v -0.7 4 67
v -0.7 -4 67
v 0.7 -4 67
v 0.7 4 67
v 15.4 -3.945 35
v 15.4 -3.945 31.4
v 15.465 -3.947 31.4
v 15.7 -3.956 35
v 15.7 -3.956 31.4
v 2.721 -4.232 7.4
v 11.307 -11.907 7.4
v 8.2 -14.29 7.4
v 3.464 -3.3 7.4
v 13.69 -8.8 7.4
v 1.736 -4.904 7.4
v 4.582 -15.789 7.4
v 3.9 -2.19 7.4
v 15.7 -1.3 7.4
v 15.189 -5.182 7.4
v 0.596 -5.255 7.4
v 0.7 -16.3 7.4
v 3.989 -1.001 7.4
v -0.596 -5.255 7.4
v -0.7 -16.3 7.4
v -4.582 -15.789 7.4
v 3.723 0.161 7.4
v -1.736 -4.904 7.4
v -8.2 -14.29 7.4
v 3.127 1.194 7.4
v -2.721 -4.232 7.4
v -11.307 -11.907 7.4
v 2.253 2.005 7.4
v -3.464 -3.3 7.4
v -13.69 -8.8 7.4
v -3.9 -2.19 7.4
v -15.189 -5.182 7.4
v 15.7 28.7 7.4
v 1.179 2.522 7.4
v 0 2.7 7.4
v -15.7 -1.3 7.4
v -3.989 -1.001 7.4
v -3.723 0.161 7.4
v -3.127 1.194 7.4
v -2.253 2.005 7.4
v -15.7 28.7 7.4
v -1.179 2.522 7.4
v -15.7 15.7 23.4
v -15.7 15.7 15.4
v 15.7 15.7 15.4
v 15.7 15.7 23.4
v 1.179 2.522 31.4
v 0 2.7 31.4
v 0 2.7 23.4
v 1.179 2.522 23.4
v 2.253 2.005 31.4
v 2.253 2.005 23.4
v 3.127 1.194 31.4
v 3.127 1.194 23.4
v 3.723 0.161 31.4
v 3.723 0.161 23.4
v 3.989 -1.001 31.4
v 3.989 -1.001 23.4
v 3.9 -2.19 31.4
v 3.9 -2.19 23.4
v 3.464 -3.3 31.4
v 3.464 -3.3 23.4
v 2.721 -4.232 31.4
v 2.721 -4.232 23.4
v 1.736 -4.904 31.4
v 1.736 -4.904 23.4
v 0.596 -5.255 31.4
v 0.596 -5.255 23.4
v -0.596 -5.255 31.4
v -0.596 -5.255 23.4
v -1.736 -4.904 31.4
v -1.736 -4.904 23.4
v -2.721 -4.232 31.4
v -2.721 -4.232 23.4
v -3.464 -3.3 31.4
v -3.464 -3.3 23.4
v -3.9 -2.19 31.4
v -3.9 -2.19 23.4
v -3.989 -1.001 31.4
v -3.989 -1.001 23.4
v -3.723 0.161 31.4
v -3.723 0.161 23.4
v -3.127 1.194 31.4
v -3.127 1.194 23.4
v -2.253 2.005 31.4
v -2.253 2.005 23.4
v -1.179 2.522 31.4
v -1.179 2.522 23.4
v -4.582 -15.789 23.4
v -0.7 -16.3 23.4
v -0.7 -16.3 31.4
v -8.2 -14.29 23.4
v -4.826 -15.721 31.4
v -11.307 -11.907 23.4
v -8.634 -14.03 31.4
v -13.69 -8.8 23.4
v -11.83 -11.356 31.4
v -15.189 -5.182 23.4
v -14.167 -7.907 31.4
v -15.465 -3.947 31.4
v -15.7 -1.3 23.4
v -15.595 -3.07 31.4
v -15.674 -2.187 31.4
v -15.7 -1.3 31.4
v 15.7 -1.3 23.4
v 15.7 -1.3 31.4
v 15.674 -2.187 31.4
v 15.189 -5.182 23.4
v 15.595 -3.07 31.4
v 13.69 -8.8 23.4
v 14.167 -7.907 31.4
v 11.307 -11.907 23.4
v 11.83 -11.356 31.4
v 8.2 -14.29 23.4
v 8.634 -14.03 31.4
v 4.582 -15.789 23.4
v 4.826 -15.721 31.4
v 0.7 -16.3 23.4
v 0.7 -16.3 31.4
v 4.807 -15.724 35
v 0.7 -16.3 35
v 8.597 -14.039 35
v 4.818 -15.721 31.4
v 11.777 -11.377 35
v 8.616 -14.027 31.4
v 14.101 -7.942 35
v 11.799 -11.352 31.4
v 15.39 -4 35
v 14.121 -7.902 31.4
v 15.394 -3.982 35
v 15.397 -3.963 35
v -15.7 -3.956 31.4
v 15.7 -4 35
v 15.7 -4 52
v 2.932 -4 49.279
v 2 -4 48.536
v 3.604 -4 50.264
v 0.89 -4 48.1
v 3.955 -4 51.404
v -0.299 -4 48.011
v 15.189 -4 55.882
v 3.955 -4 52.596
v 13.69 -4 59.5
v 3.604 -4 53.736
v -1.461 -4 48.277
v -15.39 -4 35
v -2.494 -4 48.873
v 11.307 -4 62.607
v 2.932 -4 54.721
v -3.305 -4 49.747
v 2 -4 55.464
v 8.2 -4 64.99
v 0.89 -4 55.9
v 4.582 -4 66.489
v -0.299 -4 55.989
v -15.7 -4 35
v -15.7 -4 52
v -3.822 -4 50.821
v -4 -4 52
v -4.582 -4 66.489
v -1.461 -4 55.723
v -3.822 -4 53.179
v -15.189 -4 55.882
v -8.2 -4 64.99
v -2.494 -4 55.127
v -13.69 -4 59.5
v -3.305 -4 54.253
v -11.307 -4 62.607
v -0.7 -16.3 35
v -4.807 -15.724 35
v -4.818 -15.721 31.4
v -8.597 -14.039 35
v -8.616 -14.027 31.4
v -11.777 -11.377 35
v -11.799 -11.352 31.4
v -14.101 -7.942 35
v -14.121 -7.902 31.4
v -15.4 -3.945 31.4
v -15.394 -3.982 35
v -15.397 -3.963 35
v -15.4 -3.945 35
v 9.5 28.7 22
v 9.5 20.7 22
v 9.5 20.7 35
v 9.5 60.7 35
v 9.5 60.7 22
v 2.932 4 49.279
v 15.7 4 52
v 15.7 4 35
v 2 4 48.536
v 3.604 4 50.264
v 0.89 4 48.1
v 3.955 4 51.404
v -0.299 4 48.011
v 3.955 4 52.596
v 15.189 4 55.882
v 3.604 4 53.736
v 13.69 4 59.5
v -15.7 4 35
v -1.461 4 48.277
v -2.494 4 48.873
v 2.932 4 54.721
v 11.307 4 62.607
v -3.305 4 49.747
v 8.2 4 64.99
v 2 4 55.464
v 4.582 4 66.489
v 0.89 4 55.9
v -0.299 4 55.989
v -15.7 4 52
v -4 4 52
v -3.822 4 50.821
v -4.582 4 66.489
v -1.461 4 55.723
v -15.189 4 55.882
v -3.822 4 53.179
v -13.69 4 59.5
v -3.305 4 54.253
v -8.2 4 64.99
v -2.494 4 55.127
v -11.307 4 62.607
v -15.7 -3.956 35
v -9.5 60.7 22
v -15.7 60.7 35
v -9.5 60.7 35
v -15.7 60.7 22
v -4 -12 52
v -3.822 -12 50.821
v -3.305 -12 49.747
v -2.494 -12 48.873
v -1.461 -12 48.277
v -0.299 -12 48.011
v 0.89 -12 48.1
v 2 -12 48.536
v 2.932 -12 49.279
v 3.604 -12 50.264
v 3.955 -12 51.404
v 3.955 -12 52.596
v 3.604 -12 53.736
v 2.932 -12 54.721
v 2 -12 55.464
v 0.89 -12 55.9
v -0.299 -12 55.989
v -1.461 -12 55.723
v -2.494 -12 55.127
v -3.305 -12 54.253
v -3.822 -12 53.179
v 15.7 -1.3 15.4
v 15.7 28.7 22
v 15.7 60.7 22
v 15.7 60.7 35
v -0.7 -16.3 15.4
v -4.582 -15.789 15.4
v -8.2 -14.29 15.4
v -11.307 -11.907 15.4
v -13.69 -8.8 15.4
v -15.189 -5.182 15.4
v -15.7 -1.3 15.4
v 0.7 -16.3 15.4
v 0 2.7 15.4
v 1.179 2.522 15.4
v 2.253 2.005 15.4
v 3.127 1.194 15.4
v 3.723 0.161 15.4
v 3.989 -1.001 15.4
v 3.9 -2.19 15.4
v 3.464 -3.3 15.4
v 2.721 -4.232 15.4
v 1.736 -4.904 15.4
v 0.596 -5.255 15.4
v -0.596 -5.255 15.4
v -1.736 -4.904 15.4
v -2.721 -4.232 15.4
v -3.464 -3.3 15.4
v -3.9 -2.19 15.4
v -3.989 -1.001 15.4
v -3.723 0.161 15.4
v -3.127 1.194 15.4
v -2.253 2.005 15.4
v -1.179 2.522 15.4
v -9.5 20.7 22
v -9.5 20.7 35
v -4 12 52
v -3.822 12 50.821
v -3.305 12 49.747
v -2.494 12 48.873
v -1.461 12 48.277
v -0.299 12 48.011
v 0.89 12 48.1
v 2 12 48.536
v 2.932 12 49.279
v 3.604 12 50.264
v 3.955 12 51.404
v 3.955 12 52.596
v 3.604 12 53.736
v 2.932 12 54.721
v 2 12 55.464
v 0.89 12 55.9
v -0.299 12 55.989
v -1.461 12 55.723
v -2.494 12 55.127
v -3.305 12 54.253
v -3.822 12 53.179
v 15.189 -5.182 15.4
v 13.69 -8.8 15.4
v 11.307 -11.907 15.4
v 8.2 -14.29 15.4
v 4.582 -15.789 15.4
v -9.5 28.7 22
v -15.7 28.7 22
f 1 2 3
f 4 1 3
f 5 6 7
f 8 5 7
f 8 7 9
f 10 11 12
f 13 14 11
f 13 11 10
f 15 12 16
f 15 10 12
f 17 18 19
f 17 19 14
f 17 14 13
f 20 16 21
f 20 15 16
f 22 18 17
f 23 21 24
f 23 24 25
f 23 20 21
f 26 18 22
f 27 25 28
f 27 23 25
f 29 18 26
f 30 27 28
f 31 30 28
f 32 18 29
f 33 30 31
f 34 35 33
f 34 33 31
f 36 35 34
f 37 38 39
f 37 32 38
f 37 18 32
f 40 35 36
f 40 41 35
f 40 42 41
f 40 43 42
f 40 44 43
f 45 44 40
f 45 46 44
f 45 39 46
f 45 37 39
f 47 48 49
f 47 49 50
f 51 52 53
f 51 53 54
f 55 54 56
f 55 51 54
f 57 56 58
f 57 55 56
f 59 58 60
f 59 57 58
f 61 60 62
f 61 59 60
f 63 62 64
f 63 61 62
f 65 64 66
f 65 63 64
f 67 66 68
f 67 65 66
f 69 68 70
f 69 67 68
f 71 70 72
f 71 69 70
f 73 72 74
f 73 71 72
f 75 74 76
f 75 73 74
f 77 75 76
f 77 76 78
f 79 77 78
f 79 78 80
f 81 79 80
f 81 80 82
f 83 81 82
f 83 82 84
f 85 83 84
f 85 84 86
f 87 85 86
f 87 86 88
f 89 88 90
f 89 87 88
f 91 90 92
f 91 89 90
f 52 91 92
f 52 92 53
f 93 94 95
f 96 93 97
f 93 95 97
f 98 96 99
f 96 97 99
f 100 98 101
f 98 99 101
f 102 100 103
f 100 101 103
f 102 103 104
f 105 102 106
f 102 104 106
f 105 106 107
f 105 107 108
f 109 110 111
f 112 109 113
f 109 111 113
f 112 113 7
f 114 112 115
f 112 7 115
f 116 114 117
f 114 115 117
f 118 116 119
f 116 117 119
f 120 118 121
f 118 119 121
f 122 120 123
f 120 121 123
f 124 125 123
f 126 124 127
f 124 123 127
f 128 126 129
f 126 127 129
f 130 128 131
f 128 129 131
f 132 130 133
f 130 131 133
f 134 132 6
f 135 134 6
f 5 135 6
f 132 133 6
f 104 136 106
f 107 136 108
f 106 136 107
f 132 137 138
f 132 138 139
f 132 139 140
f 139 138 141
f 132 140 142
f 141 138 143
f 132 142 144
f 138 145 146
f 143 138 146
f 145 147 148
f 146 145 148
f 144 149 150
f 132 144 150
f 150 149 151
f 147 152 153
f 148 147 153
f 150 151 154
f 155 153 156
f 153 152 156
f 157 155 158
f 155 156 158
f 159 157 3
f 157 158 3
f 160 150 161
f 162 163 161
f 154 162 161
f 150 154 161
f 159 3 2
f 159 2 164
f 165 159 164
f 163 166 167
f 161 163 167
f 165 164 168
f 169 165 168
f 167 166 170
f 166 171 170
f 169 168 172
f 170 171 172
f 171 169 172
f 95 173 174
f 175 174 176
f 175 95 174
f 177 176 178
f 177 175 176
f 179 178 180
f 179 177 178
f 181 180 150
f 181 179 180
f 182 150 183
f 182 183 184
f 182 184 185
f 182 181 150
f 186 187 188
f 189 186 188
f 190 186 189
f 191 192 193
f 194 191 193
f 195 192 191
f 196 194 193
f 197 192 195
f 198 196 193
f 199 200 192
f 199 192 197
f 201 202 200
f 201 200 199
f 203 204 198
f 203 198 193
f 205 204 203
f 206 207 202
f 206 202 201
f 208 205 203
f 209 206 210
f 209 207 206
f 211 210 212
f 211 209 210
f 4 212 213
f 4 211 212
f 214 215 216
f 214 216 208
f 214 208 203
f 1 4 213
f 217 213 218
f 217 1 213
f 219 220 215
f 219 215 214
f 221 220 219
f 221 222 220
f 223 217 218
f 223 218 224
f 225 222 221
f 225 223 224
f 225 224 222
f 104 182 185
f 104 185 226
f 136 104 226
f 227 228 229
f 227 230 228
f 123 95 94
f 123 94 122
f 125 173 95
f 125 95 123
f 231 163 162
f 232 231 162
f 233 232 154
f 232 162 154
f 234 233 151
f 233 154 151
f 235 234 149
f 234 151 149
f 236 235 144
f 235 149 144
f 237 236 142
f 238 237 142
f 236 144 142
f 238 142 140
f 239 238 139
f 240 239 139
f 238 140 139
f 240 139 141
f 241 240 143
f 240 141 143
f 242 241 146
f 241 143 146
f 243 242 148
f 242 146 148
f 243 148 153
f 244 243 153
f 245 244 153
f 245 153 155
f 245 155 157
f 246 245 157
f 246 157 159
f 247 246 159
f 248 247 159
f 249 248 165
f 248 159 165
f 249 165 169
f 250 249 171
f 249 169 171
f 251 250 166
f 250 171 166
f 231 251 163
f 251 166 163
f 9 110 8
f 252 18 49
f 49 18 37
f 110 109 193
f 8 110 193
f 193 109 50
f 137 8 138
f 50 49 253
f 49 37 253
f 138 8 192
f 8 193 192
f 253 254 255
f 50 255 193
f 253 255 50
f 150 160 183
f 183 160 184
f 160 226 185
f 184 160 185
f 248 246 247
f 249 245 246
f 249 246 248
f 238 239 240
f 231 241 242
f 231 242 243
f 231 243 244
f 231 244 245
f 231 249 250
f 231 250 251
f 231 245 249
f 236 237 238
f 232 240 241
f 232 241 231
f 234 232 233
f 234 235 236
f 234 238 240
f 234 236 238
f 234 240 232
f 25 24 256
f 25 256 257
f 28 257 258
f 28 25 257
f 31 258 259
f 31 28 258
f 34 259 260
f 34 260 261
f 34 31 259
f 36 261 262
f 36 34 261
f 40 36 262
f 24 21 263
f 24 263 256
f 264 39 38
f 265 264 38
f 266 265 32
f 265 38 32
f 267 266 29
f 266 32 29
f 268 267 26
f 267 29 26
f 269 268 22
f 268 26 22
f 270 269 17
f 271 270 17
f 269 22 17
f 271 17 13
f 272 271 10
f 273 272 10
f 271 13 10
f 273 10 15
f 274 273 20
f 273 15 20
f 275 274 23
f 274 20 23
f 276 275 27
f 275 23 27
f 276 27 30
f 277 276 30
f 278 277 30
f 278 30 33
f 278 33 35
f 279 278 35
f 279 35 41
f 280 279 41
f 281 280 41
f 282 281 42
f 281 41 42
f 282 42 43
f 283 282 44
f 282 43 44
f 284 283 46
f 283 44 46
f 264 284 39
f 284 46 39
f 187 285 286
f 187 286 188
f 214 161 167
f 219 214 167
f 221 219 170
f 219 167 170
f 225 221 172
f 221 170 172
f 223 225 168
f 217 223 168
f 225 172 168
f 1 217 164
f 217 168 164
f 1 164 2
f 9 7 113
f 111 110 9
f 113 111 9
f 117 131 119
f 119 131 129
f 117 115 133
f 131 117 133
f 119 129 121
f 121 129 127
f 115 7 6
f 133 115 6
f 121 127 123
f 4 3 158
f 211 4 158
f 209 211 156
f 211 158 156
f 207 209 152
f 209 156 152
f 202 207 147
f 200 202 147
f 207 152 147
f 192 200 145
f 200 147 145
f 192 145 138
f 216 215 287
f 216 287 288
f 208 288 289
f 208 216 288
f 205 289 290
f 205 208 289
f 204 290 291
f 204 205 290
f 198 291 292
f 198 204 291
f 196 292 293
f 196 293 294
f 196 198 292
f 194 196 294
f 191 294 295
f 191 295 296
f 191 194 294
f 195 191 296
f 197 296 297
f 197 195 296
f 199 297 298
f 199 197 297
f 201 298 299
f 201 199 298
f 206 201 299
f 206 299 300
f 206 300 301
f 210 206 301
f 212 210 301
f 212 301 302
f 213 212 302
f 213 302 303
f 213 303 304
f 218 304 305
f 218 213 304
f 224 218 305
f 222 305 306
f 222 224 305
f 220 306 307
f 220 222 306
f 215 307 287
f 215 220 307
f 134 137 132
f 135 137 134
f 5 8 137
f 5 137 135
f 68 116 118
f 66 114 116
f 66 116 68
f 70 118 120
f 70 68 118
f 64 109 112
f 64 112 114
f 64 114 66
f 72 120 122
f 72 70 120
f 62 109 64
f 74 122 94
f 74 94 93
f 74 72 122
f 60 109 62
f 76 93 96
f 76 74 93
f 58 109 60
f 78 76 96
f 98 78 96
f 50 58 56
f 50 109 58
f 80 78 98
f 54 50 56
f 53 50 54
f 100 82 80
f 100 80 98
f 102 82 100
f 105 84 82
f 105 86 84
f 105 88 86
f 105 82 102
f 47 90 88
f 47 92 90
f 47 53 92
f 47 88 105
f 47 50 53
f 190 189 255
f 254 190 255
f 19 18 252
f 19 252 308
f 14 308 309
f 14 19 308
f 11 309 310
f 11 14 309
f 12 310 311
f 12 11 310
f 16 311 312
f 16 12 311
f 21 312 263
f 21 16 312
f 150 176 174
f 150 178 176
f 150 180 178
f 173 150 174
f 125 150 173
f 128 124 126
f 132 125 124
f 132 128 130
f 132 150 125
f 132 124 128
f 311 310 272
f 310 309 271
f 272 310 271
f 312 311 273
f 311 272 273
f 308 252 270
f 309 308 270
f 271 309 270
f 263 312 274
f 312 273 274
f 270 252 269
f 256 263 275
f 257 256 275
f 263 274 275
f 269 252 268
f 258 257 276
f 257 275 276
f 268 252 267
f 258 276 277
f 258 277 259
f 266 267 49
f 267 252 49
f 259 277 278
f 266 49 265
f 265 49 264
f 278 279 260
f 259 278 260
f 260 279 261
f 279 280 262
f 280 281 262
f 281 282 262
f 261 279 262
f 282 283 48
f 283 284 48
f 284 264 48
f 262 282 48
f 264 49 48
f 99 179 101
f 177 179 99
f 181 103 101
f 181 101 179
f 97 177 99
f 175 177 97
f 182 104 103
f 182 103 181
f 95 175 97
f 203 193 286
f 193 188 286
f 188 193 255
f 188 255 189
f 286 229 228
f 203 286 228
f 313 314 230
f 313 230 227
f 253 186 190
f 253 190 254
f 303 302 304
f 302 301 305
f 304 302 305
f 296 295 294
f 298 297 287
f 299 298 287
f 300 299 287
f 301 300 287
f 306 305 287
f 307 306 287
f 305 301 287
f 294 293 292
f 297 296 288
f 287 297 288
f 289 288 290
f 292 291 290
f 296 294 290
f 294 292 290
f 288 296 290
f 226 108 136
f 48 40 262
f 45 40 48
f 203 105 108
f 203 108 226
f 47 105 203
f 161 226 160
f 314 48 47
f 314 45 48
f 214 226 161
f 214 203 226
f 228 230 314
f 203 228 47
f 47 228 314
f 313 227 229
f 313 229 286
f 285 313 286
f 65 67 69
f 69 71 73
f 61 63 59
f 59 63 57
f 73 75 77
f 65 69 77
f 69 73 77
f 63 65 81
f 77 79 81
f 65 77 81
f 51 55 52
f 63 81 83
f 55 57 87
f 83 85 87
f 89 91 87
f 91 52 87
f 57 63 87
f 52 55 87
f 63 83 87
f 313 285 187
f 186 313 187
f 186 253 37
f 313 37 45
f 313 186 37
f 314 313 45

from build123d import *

# Parameters (mm, degrees)
SKETCH4_W            = 31.4
SKETCH4_H            = 31.4
SKETCH4_W_2          = 25.4
SKETCH4_H_2          = 25.4
BOSS_EXTRUDE3_DEPTH  = 30
SKETCH5_W            = 31.4
SKETCH5_H            = 31.4
BOSS_EXTRUDE4_DEPTH  = 5
SKETCH6_W            = 31.4
SKETCH6_H            = 8
BOSS_EXTRUDE5_DEPTH  = 5
BOSS_EXTRUDE6_DEPTH  = 8
SKETCH8_R            = 4
BOSS_EXTRUDE7_DEPTH  = 8
SKETCH9_W            = 31.4
SKETCH9_H            = 10
BOSS_EXTRUDE8_DEPTH  = 5
SKETCH10_W           = 31.4
SKETCH10_H           = 10
BOSS_EXTRUDE9_DEPTH  = 13
SKETCH11_W           = 6.2
SKETCH11_H           = 10
BOSS_EXTRUDE10_DEPTH = 40
BOSS_EXTRUDE11_DEPTH = 3
SKETCH13_W           = 31.4
SKETCH13_H           = 31.4
CUT_EXTRUDE1_DEPTH   = 31.4
SKETCH15_R           = 4
BOSS_EXTRUDE12_DEPTH = 8
SKETCH16_W           = 31.4
SKETCH16_H           = 13
BOSS_EXTRUDE13_DEPTH = 4.6
SKETCH17_W           = 31.4
SKETCH17_H           = 3.6
BOSS_EXTRUDE14_DEPTH = 0.6
CUT_EXTRUDE2_DEPTH   = 3.6


with BuildPart() as part:
    # Sketch4 → Boss-Extrude3 (new body)
    with BuildSketch(Plane.XY):
        Rectangle(SKETCH4_W, SKETCH4_H)
        Rectangle(SKETCH4_W_2, SKETCH4_H_2, mode=Mode.SUBTRACT)
    extrude(amount=BOSS_EXTRUDE3_DEPTH)

    # Sketch5 → Boss-Extrude4 (add)
    with BuildSketch(Plane.XY.offset(30)):
        Rectangle(SKETCH5_W, SKETCH5_H)
    extrude(amount=BOSS_EXTRUDE4_DEPTH)

    # Sketch6 → Boss-Extrude5 (add)
    with BuildSketch(Plane.XY.offset(35)):
        Rectangle(SKETCH6_W, SKETCH6_H)
    extrude(amount=BOSS_EXTRUDE5_DEPTH)

    # Sketch7 → Boss-Extrude6 (add)
    with BuildSketch(Plane.XZ.offset(4)):
        with BuildLine():
            Line((-15.7, 40), (-15.7, 52))
            ThreePointArc((-15.7, 52), (-11.306601718, 62.606601718), (-0.7, 67))
            Line((-0.7, 67), (0.7, 67))
            ThreePointArc((0.7, 67), (11.306601718, 62.606601718), (15.7, 52))
            Line((15.7, 52), (15.7, 40))
            Line((15.7, 40), (-15.7, 40))
        make_face()
    extrude(amount=-BOSS_EXTRUDE6_DEPTH)

    # Sketch8 → Boss-Extrude7 (add)
    with BuildSketch(Plane.XZ.offset(4)):
        with Locations(Location((0, 52, 0), (0, 0, 180))):
            Circle(SKETCH8_R)
    boss_extrude7 = extrude(amount=BOSS_EXTRUDE7_DEPTH)

    # Mirror1: Boss-Extrude7 across plane
    add(boss_extrude7.mirror(Plane.ZX))

    # Sketch9 → Boss-Extrude8 (add)
    with BuildSketch(Plane(origin=(0, 15.7, 0), x_dir=(1, 0, 0), z_dir=(0, 1, 0))):
        with Locations((0, -27)):
            Rectangle(SKETCH9_W, SKETCH9_H)
    extrude(amount=BOSS_EXTRUDE8_DEPTH)

    # Sketch10 → Boss-Extrude9 (add)
    with BuildSketch(Plane(origin=(0, 15.7, 0), x_dir=(1, 0, 0), z_dir=(0, 1, 0))):
        with Locations((0, -17)):
            Rectangle(SKETCH10_W, SKETCH10_H)
    extrude(amount=BOSS_EXTRUDE9_DEPTH)

    # Sketch11 → Boss-Extrude10 (add)
    with BuildSketch(Plane(origin=(0, 20.7, 0), x_dir=(1, 0, 0), z_dir=(0, 1, 0))):
        with Locations((-12.6, -27)):
            Rectangle(SKETCH11_W, SKETCH11_H)
        with Locations((12.6, -27)):
            Rectangle(SKETCH11_W, SKETCH11_H)
    extrude(amount=BOSS_EXTRUDE10_DEPTH)

    # Sketch12 → Boss-Extrude11 (add)
    with BuildSketch(Plane.XY.offset(32)):
        Polygon((-15.7, 60.7), (-9.5, 60.7), (-9.5, 20.7), (9.5, 20.7), (9.5, 60.7), (15.7, 60.7), (15.7, 15.7), (-15.7, 15.7), align=None)
    extrude(amount=BOSS_EXTRUDE11_DEPTH)

    # Sketch13 → Cut-Extrude1 (cut)
    with BuildSketch(Plane.ZY.offset(15.7)):
        with Locations((15.7, 0)):
            Rectangle(SKETCH13_W, SKETCH13_H)
    extrude(amount=-CUT_EXTRUDE1_DEPTH, mode=Mode.SUBTRACT)

    # Sketch15 → Boss-Extrude12 (add)
    with BuildSketch(Plane(origin=(0, 0, 31.4), x_dir=(-1, 0, 0), z_dir=(0, 0, -1))):
        with BuildLine():
            Line((15.7, -1.3), (15.7, 15.7))
            Line((15.7, 15.7), (-15.7, 15.7))
            Line((-15.7, 15.7), (-15.7, -1.3))
            ThreePointArc((-15.7, -1.3), (-11.306601718, -11.906601718), (-0.7, -16.3))
            Line((-0.7, -16.3), (0.7, -16.3))
            ThreePointArc((0.7, -16.3), (11.306601718, -11.906601718), (15.7, -1.3))
        make_face()
        with Locations(Location((0, -1.3, 0), (0, 0, 90))):
            Circle(SKETCH15_R, mode=Mode.SUBTRACT)
    boss_extrude12 = extrude(amount=BOSS_EXTRUDE12_DEPTH)

    # Mirror2: Boss-Extrude12 across plane
    add(boss_extrude12.mirror(Plane(origin=(0, 0, 19.4), x_dir=(1, 0, 0), z_dir=(0, 0, -1))))

    # Sketch16 → Boss-Extrude13 (add)
    with BuildSketch(Plane(origin=(0, 0, 12), x_dir=(-1, 0, 0), z_dir=(0, 0, -1))):
        with Locations((0, 22.2)):
            Rectangle(SKETCH16_W, SKETCH16_H)
    extrude(amount=BOSS_EXTRUDE13_DEPTH)

    # Sketch17 → Boss-Extrude14 (add)
    with BuildSketch(Plane.XZ.offset(15.7)):
        with Locations((0, 33.2)):
            Rectangle(SKETCH17_W, SKETCH17_H)
    extrude(amount=BOSS_EXTRUDE14_DEPTH)

    # Sketch24 → Cut-Extrude2 (cut)
    with BuildSketch(Plane(origin=(0, 0, 31.4), x_dir=(-1, 0, 0), z_dir=(0, 0, -1))):
        with BuildLine():
            Line((-15.7, -3.955876224), (-15.7, -16.3))
            Line((-15.7, -16.3), (-0.7, -16.3))
            ThreePointArc((-0.7, -16.3), (-10.301298901, -12.800983891), (-15.399984201, -3.944829955))
            Line((-15.399984201, -3.944829955), (-15.7, -3.955876224))
        make_face()
    cut_extrude2 = extrude(amount=-CUT_EXTRUDE2_DEPTH, mode=Mode.SUBTRACT)

    # Mirror3: Cut-Extrude2 across plane
    add(cut_extrude2.mirror(Plane(origin=(0, 0, 0), x_dir=(0, 0, 1), z_dir=(1, 0, 0))), mode=Mode.SUBTRACT)


solid = part.part
